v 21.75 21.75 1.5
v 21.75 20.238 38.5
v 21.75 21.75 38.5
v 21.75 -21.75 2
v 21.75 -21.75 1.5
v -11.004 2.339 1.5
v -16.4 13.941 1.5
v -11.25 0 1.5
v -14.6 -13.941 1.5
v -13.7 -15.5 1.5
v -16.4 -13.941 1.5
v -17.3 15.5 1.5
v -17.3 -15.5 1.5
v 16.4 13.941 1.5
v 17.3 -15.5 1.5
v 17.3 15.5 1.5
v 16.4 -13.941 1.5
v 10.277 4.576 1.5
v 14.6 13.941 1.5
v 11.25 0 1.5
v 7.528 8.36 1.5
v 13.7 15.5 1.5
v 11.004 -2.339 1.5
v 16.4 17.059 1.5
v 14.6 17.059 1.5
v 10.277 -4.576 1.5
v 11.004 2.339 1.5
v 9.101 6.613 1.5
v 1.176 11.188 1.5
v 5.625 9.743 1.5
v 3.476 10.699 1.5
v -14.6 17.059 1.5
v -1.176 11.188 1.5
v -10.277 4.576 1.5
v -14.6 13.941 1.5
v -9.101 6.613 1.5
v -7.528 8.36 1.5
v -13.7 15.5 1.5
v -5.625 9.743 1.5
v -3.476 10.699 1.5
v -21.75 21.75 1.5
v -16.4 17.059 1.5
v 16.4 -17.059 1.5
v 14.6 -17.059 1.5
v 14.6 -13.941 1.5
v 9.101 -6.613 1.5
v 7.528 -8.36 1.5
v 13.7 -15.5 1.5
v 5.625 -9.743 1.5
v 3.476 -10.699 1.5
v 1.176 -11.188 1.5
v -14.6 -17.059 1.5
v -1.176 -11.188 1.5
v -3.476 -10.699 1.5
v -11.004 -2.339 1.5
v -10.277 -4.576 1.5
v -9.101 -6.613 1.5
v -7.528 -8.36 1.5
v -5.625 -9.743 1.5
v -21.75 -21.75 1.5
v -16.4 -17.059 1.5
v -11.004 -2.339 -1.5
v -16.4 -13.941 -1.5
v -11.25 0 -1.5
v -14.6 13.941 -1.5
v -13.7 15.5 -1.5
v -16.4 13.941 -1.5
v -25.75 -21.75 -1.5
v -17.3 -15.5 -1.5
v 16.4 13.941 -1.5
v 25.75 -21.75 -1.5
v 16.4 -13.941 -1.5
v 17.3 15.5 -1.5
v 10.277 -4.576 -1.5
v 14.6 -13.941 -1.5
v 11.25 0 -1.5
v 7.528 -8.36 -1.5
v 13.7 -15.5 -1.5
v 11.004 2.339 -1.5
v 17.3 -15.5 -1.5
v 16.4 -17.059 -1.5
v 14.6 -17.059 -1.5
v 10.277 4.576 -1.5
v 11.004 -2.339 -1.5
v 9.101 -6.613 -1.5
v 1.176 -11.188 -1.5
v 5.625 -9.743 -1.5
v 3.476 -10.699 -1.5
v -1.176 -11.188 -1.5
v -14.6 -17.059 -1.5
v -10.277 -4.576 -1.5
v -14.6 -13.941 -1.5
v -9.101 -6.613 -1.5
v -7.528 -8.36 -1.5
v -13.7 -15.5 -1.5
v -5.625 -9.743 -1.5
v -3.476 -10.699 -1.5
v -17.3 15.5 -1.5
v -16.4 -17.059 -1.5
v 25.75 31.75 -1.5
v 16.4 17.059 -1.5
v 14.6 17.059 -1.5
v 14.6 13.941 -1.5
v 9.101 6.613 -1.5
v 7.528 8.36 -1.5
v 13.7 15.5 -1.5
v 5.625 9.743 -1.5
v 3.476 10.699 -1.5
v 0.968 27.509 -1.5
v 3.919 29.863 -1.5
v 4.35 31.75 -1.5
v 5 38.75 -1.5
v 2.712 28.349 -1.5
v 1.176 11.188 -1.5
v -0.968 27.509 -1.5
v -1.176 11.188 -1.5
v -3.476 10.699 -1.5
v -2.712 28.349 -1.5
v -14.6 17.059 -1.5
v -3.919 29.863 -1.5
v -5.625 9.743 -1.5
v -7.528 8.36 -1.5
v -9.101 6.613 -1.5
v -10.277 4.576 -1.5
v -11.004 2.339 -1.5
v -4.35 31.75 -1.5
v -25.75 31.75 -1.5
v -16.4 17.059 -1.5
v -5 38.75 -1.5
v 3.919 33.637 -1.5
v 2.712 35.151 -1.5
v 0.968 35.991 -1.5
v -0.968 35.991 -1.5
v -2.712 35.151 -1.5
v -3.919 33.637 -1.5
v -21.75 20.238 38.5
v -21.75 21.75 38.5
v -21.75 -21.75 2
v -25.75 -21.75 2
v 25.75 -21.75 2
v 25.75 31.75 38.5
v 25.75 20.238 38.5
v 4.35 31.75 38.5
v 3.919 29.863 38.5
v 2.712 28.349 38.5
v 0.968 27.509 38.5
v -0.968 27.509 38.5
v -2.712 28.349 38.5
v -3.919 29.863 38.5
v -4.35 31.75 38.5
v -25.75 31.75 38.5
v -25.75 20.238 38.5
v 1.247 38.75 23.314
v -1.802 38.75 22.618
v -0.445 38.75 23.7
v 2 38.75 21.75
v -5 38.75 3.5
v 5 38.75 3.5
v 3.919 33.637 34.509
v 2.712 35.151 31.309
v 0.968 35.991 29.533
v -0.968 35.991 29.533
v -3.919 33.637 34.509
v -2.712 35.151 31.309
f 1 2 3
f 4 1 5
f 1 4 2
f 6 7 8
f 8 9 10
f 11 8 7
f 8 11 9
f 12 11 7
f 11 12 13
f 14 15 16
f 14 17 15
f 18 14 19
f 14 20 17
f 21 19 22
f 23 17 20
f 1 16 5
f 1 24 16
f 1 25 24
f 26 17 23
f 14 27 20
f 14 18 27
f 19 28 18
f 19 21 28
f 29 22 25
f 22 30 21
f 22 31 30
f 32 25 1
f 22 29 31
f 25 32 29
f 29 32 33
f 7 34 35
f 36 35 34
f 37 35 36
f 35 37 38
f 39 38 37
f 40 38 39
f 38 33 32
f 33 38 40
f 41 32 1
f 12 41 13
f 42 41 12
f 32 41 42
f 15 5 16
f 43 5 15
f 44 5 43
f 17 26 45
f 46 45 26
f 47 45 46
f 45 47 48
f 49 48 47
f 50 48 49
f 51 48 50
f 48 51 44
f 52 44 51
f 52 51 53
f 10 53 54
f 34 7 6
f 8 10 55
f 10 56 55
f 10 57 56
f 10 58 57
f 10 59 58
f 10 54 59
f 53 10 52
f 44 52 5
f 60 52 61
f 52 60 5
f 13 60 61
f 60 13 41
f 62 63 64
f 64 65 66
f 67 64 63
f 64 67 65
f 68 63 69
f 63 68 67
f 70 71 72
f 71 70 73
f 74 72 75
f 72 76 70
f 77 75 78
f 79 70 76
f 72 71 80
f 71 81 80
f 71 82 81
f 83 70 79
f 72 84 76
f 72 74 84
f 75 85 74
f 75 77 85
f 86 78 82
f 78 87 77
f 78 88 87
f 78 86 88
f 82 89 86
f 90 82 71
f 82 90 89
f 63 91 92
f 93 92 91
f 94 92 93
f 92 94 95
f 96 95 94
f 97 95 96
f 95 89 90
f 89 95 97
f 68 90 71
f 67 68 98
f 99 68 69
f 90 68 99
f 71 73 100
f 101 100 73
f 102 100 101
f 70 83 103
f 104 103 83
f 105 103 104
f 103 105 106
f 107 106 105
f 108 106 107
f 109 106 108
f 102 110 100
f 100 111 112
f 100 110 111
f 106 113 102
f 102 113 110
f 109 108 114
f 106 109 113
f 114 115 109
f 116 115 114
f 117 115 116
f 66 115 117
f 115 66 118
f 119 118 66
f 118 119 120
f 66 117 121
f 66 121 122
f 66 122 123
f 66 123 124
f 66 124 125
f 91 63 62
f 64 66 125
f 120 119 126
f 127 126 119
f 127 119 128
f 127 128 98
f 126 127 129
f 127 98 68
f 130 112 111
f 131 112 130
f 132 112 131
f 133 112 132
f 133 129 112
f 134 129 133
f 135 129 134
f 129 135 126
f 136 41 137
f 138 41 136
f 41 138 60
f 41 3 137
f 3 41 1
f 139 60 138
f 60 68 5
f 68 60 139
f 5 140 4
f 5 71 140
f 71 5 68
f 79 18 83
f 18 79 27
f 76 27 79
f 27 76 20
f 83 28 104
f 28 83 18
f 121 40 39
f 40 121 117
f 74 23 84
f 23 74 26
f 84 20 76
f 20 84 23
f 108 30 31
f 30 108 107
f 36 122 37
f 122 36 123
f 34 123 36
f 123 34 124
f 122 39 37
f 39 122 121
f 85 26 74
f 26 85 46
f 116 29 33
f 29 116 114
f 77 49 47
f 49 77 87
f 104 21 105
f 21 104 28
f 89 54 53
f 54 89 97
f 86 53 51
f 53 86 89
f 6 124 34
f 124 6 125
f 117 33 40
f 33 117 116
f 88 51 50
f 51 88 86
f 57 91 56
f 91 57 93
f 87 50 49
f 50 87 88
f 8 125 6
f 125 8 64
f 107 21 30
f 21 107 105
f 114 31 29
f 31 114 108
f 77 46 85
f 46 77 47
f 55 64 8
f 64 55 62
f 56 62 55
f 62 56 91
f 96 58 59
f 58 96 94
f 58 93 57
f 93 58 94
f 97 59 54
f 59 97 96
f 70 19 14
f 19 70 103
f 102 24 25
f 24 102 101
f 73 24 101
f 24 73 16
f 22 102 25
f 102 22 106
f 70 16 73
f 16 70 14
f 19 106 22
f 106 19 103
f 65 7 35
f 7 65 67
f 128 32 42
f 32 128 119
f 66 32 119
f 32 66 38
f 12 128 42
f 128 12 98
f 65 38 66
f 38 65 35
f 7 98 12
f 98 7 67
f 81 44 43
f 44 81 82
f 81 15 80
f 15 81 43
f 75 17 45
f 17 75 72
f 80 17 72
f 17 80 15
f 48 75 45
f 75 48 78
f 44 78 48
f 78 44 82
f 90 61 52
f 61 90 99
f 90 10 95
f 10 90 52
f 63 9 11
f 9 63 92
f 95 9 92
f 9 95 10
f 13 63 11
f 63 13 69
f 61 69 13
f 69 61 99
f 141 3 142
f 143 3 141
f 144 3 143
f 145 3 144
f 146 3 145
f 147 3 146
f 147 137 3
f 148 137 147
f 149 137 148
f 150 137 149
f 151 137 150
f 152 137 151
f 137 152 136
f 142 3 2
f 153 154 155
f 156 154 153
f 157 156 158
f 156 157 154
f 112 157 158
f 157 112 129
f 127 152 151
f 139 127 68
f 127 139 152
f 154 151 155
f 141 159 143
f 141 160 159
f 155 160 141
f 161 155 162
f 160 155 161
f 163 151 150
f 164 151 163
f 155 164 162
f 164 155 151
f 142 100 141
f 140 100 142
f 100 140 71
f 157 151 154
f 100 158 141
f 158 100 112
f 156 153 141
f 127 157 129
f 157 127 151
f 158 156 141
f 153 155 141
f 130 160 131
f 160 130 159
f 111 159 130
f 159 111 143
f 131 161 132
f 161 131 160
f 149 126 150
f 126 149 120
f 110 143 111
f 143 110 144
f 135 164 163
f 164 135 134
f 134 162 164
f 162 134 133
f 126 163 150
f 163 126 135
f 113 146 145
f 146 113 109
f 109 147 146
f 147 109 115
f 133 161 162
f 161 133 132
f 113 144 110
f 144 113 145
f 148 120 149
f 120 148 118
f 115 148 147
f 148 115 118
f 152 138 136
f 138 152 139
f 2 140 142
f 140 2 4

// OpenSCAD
//X and Y Motor Mount


//Nema17
N17ScrewHoleSizeR = 1.8;
N17ScrewHoleDistance = 31;
N17Width =43.5;
N17CenterHoleR = 22.5/2;
RodHole=8.7/2;

difference()
{
	cube([N17Width, N17Width, 3], center=true);
	cylinder(h=4,r=N17CenterHoleR, center=true);
	translate([N17ScrewHoleDistance/2,N17ScrewHoleDistance/2,-2], center=true) cylinder(h=4,r=N17ScrewHoleSizeR);
	translate([-N17ScrewHoleDistance/2,N17ScrewHoleDistance/2,-2], center=true) cylinder(h=4,r=N17ScrewHoleSizeR);
	translate([N17ScrewHoleDistance/2,-N17ScrewHoleDistance/2,-2], center=true) cylinder(h=4,r=N17ScrewHoleSizeR);
	translate([-N17ScrewHoleDistance/2,-N17ScrewHoleDistance/2,-2], center=true) cylinder(h=4,r=N17ScrewHoleSizeR);
}


RodSupportWidth=10;
SideWallWidth = 4;
difference()
{
	hull()
	{
		translate([-N17Width/2-SideWallWidth,N17Width/2,-1.5]) cube([N17Width+SideWallWidth*2,RodSupportWidth,40]);
		translate([0,N17Width/2,N17Width/2]) rotate([270,0,0])  cylinder(h=RodSupportWidth+7,r=2);
		translate([-5,N17Width/2,-1.5])   cube([10,RodSupportWidth+7,5]);
	}

	translate([0,N17Width/2+RodSupportWidth/2+5,-2] ) cylinder(h=90,r=RodHole);
}



//SideWall Left
difference()
{
	translate([-N17Width/2-SideWallWidth,-N17Width/2,-1.5]) cube([SideWallWidth,N17Width+RodSupportWidth,40]);
	translate([-N17Width/2-SideWallWidth-1,-N17Width/2,2]) rotate([41,0,0]) cube([SideWallWidth+1.1,N17Width+RodSupportWidth+5,45]);
}


//SideWall Right
difference()
{
	translate([N17Width/2,-N17Width/2,-1.5]) cube([SideWallWidth,N17Width+RodSupportWidth,40]);
	translate([N17Width/2-1,-N17Width/2,2]) rotate([41,0,0]) cube([SideWallWidth+1.1,N17Width+RodSupportWidth+5,45]);
}
